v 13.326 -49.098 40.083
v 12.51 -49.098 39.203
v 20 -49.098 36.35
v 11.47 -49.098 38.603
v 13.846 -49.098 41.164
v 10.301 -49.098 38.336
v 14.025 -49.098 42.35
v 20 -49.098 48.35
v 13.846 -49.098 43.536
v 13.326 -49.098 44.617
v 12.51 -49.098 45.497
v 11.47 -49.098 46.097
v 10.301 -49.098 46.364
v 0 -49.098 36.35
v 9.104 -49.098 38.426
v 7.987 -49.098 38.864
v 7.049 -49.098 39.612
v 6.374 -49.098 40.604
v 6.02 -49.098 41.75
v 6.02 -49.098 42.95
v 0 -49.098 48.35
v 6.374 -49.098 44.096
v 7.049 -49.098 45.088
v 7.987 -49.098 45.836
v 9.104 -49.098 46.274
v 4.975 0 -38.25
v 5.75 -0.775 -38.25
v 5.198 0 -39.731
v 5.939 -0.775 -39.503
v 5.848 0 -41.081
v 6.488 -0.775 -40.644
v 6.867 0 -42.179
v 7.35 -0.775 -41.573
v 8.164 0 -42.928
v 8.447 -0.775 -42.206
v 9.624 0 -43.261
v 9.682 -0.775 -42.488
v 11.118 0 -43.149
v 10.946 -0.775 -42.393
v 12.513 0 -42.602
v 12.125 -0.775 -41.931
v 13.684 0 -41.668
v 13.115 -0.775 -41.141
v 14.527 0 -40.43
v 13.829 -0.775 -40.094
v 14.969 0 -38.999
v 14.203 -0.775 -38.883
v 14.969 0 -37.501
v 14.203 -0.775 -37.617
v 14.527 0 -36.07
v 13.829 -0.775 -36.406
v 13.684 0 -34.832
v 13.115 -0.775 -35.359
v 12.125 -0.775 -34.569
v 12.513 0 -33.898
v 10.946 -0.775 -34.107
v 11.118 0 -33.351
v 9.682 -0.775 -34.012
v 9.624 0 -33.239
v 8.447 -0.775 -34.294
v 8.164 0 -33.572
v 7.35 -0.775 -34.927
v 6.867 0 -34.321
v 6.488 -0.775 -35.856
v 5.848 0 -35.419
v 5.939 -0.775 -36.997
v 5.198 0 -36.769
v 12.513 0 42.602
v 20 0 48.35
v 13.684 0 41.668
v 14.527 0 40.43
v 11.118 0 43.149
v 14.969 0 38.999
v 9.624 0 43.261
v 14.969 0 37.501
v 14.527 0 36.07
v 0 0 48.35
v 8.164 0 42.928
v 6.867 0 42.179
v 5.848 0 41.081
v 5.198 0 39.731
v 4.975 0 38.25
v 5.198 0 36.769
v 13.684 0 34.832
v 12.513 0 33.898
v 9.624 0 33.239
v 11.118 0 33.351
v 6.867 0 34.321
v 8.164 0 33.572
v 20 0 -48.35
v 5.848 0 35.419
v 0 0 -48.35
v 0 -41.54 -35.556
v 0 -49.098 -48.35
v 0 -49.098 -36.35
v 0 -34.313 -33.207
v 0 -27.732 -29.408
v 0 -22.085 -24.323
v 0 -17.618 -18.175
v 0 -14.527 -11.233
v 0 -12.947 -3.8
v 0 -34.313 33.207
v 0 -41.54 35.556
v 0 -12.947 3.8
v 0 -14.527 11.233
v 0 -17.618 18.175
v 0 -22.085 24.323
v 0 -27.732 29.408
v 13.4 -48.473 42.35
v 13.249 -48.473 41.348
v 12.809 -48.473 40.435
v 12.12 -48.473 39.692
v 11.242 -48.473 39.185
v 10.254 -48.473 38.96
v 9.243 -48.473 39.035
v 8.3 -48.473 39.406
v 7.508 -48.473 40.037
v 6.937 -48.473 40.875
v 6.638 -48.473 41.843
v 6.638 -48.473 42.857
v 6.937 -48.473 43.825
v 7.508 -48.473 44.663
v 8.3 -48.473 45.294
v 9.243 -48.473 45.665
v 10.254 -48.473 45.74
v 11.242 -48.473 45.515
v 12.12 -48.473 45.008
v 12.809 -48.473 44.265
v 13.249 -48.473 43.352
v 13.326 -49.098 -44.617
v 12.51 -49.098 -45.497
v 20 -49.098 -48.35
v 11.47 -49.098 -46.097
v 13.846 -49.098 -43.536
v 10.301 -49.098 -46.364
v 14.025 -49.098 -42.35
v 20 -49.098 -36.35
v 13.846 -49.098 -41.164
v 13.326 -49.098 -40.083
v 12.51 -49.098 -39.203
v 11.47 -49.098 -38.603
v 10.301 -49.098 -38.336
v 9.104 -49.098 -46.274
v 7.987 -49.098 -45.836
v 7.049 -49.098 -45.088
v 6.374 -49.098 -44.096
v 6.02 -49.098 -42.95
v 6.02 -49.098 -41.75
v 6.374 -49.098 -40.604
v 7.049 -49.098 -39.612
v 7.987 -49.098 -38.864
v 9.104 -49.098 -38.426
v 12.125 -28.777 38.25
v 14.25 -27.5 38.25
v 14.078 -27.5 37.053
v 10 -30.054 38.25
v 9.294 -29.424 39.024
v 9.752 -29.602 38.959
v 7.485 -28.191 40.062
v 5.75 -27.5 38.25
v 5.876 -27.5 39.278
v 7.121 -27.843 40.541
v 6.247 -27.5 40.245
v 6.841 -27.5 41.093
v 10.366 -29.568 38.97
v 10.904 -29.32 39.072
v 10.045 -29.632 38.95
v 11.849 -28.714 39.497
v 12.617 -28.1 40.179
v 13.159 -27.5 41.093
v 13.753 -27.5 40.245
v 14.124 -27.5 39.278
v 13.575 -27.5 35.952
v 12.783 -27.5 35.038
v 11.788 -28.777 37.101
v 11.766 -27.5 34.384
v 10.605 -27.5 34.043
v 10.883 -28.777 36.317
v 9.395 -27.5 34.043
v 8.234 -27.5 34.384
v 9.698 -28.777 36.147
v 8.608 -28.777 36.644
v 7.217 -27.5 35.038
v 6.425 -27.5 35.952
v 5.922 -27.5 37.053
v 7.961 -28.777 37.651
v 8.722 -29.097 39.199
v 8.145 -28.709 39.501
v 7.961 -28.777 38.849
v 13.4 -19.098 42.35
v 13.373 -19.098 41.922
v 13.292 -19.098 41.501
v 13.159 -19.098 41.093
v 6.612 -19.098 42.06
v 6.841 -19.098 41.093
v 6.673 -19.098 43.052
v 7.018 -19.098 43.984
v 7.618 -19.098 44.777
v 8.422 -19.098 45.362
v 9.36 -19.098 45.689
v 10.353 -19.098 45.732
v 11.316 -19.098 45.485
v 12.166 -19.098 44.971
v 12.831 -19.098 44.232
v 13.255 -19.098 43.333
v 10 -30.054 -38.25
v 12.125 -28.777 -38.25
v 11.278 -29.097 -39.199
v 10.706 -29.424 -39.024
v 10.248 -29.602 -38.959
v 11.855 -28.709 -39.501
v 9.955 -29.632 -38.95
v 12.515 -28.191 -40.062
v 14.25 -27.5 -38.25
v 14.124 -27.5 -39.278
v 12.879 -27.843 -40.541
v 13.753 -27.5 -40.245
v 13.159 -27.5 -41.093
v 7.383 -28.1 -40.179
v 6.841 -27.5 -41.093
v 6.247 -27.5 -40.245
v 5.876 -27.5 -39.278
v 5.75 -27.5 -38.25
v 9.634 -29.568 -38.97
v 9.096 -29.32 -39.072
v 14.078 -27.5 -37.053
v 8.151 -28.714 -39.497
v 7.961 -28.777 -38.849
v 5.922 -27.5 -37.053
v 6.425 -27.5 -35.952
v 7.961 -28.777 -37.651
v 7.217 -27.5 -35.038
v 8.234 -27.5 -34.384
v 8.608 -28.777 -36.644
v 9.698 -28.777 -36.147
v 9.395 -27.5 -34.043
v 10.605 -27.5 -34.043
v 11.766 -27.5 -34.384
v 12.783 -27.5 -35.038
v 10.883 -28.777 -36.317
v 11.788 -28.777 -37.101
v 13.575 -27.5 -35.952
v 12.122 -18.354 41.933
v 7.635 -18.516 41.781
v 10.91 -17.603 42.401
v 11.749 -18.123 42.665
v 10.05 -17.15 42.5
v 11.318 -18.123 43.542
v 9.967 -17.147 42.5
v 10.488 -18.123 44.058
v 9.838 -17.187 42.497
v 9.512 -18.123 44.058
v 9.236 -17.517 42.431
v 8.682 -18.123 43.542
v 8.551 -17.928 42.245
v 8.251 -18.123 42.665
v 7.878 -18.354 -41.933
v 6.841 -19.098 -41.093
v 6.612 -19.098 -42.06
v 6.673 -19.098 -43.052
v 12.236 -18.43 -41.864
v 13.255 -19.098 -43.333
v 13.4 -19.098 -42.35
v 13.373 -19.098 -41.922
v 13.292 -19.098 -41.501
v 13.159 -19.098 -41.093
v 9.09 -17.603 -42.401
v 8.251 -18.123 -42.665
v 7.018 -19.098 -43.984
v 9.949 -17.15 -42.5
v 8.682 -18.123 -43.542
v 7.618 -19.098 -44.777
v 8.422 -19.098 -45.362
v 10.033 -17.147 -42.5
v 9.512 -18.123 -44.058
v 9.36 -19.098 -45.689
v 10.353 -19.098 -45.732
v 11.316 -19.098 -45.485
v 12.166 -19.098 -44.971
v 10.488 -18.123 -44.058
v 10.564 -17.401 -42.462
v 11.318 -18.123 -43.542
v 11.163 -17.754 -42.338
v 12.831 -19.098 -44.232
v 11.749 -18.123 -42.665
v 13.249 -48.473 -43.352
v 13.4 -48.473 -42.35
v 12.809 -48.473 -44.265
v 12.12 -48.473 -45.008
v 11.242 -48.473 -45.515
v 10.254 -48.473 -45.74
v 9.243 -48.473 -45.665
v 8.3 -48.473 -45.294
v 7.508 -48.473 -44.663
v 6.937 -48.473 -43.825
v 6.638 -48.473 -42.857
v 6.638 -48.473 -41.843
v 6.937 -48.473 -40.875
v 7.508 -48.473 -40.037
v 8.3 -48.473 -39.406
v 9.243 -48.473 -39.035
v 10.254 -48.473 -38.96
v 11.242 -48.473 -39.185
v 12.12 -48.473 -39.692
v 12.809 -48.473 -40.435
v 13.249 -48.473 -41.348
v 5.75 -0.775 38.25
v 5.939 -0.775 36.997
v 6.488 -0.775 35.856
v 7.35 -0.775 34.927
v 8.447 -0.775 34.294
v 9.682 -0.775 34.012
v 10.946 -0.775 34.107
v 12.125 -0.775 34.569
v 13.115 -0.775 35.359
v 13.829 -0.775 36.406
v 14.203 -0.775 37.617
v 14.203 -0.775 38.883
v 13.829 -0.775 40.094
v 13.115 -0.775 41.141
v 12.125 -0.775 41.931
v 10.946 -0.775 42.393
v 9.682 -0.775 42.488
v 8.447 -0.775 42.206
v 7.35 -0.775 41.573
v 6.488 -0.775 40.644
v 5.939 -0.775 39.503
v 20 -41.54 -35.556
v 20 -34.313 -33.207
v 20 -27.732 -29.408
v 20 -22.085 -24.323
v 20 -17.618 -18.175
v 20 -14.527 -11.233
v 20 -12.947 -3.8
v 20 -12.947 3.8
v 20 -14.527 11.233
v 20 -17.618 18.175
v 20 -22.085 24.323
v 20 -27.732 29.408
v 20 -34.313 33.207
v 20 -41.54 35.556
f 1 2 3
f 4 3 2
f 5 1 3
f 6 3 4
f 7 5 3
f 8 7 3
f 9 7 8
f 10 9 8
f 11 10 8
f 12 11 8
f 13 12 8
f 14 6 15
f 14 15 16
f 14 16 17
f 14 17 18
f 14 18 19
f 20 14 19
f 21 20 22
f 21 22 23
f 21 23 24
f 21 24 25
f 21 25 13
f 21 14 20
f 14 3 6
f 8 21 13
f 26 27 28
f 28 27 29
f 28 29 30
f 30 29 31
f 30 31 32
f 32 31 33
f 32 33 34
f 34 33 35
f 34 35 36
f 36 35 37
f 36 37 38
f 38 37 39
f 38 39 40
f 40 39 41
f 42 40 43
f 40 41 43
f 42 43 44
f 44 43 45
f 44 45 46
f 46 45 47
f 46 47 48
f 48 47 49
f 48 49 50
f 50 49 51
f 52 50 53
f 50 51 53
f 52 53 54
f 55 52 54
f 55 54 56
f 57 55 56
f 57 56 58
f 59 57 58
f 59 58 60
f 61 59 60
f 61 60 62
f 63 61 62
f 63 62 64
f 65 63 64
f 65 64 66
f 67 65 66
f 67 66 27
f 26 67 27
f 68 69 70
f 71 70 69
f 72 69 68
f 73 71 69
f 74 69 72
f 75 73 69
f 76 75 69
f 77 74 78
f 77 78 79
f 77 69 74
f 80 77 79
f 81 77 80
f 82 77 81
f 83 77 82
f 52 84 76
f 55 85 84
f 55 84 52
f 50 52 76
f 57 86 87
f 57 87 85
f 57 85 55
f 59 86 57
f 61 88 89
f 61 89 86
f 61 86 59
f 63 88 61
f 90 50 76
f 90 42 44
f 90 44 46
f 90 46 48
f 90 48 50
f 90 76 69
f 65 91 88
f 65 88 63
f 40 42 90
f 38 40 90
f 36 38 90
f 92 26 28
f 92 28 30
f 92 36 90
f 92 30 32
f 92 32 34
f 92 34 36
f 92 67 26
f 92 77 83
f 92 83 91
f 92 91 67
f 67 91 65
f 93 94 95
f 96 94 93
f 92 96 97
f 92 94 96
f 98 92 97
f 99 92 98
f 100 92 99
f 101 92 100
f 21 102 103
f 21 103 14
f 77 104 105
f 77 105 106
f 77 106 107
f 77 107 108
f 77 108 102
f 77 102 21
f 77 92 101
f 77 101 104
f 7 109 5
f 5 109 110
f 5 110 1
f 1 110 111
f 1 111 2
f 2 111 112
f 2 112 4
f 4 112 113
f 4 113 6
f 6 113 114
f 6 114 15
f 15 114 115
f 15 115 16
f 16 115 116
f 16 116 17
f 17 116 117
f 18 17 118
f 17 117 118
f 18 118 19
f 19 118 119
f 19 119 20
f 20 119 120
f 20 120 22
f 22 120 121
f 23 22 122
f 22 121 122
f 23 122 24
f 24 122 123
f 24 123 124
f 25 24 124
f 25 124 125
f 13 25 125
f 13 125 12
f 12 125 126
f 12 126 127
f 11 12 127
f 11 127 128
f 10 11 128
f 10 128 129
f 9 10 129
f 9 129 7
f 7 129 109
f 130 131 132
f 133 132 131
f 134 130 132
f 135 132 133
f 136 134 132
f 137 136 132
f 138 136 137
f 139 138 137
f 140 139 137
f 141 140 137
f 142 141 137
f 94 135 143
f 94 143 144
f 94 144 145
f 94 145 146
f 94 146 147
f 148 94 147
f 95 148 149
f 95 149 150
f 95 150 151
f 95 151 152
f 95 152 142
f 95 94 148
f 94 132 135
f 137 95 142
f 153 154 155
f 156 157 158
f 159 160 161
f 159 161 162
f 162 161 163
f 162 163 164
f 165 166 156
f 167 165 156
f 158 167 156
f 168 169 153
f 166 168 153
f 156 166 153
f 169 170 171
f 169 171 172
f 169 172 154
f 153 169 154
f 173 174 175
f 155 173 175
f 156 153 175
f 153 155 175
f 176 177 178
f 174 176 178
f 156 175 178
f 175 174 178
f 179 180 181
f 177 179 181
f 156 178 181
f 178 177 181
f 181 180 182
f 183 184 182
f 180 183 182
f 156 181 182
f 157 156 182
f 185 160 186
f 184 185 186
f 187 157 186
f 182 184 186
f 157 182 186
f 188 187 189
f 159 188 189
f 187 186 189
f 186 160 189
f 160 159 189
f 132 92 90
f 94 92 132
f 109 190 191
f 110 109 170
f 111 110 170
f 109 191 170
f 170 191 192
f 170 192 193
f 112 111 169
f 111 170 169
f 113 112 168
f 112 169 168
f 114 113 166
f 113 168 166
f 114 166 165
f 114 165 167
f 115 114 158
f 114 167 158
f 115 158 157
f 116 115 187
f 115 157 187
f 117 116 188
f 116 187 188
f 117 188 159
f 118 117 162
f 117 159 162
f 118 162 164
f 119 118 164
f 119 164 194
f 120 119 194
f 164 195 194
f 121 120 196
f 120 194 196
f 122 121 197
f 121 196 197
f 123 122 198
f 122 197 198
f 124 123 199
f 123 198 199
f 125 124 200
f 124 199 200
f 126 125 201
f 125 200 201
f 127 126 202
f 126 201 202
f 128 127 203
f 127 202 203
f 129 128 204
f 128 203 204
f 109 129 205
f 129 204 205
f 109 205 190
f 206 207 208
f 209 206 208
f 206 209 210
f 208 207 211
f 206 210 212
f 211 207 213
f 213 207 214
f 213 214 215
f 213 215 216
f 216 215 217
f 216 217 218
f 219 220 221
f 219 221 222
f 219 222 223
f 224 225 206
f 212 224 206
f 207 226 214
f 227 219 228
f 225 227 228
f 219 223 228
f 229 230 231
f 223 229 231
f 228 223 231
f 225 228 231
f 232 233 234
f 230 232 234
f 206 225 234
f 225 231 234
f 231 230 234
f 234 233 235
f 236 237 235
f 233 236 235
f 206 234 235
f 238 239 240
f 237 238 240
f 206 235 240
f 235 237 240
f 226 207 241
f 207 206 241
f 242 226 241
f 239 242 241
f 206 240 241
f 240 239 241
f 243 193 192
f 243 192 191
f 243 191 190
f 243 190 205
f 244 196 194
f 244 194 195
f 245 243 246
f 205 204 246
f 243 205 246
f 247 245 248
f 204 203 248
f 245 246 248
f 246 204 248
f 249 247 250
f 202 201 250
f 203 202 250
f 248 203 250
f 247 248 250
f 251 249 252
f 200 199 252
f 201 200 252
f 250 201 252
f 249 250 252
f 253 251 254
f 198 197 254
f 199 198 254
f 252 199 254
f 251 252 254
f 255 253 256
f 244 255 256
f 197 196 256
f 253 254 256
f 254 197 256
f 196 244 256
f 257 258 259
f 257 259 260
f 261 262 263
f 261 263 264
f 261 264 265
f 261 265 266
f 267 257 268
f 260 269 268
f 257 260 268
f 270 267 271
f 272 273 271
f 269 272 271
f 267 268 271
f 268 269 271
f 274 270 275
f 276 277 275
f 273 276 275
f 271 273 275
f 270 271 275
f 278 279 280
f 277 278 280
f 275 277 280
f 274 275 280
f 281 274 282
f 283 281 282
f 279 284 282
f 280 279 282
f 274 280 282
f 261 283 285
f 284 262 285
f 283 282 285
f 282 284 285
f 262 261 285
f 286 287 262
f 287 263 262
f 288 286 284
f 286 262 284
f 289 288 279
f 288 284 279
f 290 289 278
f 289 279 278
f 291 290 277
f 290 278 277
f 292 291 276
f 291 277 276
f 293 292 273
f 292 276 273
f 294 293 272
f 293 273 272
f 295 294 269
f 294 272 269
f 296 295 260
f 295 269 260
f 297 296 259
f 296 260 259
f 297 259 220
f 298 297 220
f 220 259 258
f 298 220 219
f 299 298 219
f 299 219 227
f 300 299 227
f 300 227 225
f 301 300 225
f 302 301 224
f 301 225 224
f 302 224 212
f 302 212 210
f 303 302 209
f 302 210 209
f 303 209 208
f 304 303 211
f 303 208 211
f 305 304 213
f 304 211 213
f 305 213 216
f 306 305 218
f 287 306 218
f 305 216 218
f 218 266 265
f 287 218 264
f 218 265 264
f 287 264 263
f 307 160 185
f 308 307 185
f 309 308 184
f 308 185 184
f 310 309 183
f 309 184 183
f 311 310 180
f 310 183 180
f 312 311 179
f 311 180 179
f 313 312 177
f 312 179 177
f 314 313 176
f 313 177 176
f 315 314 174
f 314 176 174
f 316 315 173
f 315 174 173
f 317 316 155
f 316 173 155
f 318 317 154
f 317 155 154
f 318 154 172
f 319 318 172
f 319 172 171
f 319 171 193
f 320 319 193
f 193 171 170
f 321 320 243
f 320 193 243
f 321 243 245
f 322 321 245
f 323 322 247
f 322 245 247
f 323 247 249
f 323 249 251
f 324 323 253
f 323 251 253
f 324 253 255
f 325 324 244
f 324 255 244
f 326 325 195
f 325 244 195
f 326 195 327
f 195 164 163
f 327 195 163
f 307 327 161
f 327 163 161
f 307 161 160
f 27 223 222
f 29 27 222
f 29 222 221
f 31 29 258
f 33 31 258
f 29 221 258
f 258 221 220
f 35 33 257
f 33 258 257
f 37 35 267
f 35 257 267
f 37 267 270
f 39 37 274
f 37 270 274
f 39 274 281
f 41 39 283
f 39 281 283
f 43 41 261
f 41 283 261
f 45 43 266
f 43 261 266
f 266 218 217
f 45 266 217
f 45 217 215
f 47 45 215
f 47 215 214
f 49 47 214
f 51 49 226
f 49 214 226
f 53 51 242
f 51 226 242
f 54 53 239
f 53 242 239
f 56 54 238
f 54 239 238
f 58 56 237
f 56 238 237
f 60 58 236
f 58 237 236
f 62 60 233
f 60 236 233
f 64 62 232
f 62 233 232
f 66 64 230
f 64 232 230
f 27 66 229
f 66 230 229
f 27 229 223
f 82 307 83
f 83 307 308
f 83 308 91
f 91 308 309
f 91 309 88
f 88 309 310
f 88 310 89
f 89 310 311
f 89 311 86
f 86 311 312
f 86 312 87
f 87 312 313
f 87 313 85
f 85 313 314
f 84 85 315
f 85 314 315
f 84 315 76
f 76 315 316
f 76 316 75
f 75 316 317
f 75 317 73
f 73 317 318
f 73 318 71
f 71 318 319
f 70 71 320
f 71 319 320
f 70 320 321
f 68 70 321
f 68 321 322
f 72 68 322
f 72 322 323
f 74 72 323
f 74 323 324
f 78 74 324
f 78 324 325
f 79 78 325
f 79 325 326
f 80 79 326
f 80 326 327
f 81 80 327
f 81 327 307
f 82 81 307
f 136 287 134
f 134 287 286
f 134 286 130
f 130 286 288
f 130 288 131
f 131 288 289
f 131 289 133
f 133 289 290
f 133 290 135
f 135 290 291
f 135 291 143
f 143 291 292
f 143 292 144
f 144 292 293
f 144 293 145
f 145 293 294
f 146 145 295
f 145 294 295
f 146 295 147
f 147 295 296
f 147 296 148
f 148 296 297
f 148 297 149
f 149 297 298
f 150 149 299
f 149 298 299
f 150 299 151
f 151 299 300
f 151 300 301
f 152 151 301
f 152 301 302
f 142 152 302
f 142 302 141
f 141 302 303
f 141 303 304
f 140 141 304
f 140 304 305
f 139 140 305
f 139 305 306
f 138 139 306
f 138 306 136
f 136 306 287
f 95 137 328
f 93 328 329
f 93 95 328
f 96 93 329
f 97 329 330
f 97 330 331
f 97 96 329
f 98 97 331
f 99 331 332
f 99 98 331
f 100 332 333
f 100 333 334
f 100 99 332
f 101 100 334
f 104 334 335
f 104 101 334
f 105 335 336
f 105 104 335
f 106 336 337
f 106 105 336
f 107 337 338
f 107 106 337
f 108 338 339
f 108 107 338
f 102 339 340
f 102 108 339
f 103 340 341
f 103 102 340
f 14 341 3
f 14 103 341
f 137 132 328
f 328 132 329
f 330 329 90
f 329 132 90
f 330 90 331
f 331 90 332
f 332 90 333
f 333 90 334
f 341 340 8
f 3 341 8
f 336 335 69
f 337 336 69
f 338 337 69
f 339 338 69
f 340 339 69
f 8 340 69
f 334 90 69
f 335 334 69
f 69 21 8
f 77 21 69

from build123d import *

# Parameters (mm, degrees)
BOSS_EXTRUDE1_DEPTH          = 20
M8_TAPPED_HOLE1_D            = 6.8
M8_TAPPED_HOLE1_DEPTH        = 30
M8_TAPPED_HOLE1_CSINK_D      = 8.05
M8_TAPPED_HOLE1_CSINK_ANGLE  = 90
M8_TAPPED_HOLE1_TIP          = 2.042926105
M10_TAPPED_HOLE1_D           = 8.5
M10_TAPPED_HOLE1_DEPTH       = 27.5
M10_TAPPED_HOLE1_CSINK_D     = 10.05
M10_TAPPED_HOLE1_CSINK_ANGLE = 90
M10_TAPPED_HOLE1_TIP         = 2.553657631


with BuildPart() as part:
    # Sketch1 → Boss-Extrude1 (new body)
    with BuildSketch(Plane(origin=(0, 0, 0), x_dir=(0, 0, -1), z_dir=(1, 0, 0))):
        with BuildLine():
            Line((-48.35, 0), (48.35, 0))
            Line((48.35, 0), (48.35, -49.098))
            Line((48.35, -49.098), (36.35, -49.098))
            ThreePointArc((36.35, -49.098), (0, -12.748), (-36.35, -49.098))
            Line((-36.35, -49.098), (-48.35, -49.098))
            Line((-48.35, -49.098), (-48.35, 0))
        make_face()
    extrude(amount=BOSS_EXTRUDE1_DEPTH)

    # M8 Tapped Hole1
    with Locations(Plane(origin=(0, -49.098, 0), x_dir=(-1, 0, 0), z_dir=(0, -1, 0))):
        with Locations((-10, -42.35), (-10, 42.35)):
            CounterSinkHole(M8_TAPPED_HOLE1_D / 2, M8_TAPPED_HOLE1_CSINK_D / 2, depth=M8_TAPPED_HOLE1_DEPTH, counter_sink_angle=M8_TAPPED_HOLE1_CSINK_ANGLE)
            with Locations((0, 0, -(M8_TAPPED_HOLE1_DEPTH + M8_TAPPED_HOLE1_TIP / 2))):  # 118° drill point
                Cone(0, M8_TAPPED_HOLE1_D / 2, M8_TAPPED_HOLE1_TIP, mode=Mode.SUBTRACT)

    # M10 Tapped Hole1
    with Locations(Plane(origin=(0, 0, 0), x_dir=(1, 0, 0), z_dir=(0, 1, 0))):
        with Locations((10, -38.25), (10, 38.25)):
            CounterSinkHole(M10_TAPPED_HOLE1_D / 2, M10_TAPPED_HOLE1_CSINK_D / 2, depth=M10_TAPPED_HOLE1_DEPTH, counter_sink_angle=M10_TAPPED_HOLE1_CSINK_ANGLE)
            with Locations((0, 0, -(M10_TAPPED_HOLE1_DEPTH + M10_TAPPED_HOLE1_TIP / 2))):  # 118° drill point
                Cone(0, M10_TAPPED_HOLE1_D / 2, M10_TAPPED_HOLE1_TIP, mode=Mode.SUBTRACT)


solid = part.part
